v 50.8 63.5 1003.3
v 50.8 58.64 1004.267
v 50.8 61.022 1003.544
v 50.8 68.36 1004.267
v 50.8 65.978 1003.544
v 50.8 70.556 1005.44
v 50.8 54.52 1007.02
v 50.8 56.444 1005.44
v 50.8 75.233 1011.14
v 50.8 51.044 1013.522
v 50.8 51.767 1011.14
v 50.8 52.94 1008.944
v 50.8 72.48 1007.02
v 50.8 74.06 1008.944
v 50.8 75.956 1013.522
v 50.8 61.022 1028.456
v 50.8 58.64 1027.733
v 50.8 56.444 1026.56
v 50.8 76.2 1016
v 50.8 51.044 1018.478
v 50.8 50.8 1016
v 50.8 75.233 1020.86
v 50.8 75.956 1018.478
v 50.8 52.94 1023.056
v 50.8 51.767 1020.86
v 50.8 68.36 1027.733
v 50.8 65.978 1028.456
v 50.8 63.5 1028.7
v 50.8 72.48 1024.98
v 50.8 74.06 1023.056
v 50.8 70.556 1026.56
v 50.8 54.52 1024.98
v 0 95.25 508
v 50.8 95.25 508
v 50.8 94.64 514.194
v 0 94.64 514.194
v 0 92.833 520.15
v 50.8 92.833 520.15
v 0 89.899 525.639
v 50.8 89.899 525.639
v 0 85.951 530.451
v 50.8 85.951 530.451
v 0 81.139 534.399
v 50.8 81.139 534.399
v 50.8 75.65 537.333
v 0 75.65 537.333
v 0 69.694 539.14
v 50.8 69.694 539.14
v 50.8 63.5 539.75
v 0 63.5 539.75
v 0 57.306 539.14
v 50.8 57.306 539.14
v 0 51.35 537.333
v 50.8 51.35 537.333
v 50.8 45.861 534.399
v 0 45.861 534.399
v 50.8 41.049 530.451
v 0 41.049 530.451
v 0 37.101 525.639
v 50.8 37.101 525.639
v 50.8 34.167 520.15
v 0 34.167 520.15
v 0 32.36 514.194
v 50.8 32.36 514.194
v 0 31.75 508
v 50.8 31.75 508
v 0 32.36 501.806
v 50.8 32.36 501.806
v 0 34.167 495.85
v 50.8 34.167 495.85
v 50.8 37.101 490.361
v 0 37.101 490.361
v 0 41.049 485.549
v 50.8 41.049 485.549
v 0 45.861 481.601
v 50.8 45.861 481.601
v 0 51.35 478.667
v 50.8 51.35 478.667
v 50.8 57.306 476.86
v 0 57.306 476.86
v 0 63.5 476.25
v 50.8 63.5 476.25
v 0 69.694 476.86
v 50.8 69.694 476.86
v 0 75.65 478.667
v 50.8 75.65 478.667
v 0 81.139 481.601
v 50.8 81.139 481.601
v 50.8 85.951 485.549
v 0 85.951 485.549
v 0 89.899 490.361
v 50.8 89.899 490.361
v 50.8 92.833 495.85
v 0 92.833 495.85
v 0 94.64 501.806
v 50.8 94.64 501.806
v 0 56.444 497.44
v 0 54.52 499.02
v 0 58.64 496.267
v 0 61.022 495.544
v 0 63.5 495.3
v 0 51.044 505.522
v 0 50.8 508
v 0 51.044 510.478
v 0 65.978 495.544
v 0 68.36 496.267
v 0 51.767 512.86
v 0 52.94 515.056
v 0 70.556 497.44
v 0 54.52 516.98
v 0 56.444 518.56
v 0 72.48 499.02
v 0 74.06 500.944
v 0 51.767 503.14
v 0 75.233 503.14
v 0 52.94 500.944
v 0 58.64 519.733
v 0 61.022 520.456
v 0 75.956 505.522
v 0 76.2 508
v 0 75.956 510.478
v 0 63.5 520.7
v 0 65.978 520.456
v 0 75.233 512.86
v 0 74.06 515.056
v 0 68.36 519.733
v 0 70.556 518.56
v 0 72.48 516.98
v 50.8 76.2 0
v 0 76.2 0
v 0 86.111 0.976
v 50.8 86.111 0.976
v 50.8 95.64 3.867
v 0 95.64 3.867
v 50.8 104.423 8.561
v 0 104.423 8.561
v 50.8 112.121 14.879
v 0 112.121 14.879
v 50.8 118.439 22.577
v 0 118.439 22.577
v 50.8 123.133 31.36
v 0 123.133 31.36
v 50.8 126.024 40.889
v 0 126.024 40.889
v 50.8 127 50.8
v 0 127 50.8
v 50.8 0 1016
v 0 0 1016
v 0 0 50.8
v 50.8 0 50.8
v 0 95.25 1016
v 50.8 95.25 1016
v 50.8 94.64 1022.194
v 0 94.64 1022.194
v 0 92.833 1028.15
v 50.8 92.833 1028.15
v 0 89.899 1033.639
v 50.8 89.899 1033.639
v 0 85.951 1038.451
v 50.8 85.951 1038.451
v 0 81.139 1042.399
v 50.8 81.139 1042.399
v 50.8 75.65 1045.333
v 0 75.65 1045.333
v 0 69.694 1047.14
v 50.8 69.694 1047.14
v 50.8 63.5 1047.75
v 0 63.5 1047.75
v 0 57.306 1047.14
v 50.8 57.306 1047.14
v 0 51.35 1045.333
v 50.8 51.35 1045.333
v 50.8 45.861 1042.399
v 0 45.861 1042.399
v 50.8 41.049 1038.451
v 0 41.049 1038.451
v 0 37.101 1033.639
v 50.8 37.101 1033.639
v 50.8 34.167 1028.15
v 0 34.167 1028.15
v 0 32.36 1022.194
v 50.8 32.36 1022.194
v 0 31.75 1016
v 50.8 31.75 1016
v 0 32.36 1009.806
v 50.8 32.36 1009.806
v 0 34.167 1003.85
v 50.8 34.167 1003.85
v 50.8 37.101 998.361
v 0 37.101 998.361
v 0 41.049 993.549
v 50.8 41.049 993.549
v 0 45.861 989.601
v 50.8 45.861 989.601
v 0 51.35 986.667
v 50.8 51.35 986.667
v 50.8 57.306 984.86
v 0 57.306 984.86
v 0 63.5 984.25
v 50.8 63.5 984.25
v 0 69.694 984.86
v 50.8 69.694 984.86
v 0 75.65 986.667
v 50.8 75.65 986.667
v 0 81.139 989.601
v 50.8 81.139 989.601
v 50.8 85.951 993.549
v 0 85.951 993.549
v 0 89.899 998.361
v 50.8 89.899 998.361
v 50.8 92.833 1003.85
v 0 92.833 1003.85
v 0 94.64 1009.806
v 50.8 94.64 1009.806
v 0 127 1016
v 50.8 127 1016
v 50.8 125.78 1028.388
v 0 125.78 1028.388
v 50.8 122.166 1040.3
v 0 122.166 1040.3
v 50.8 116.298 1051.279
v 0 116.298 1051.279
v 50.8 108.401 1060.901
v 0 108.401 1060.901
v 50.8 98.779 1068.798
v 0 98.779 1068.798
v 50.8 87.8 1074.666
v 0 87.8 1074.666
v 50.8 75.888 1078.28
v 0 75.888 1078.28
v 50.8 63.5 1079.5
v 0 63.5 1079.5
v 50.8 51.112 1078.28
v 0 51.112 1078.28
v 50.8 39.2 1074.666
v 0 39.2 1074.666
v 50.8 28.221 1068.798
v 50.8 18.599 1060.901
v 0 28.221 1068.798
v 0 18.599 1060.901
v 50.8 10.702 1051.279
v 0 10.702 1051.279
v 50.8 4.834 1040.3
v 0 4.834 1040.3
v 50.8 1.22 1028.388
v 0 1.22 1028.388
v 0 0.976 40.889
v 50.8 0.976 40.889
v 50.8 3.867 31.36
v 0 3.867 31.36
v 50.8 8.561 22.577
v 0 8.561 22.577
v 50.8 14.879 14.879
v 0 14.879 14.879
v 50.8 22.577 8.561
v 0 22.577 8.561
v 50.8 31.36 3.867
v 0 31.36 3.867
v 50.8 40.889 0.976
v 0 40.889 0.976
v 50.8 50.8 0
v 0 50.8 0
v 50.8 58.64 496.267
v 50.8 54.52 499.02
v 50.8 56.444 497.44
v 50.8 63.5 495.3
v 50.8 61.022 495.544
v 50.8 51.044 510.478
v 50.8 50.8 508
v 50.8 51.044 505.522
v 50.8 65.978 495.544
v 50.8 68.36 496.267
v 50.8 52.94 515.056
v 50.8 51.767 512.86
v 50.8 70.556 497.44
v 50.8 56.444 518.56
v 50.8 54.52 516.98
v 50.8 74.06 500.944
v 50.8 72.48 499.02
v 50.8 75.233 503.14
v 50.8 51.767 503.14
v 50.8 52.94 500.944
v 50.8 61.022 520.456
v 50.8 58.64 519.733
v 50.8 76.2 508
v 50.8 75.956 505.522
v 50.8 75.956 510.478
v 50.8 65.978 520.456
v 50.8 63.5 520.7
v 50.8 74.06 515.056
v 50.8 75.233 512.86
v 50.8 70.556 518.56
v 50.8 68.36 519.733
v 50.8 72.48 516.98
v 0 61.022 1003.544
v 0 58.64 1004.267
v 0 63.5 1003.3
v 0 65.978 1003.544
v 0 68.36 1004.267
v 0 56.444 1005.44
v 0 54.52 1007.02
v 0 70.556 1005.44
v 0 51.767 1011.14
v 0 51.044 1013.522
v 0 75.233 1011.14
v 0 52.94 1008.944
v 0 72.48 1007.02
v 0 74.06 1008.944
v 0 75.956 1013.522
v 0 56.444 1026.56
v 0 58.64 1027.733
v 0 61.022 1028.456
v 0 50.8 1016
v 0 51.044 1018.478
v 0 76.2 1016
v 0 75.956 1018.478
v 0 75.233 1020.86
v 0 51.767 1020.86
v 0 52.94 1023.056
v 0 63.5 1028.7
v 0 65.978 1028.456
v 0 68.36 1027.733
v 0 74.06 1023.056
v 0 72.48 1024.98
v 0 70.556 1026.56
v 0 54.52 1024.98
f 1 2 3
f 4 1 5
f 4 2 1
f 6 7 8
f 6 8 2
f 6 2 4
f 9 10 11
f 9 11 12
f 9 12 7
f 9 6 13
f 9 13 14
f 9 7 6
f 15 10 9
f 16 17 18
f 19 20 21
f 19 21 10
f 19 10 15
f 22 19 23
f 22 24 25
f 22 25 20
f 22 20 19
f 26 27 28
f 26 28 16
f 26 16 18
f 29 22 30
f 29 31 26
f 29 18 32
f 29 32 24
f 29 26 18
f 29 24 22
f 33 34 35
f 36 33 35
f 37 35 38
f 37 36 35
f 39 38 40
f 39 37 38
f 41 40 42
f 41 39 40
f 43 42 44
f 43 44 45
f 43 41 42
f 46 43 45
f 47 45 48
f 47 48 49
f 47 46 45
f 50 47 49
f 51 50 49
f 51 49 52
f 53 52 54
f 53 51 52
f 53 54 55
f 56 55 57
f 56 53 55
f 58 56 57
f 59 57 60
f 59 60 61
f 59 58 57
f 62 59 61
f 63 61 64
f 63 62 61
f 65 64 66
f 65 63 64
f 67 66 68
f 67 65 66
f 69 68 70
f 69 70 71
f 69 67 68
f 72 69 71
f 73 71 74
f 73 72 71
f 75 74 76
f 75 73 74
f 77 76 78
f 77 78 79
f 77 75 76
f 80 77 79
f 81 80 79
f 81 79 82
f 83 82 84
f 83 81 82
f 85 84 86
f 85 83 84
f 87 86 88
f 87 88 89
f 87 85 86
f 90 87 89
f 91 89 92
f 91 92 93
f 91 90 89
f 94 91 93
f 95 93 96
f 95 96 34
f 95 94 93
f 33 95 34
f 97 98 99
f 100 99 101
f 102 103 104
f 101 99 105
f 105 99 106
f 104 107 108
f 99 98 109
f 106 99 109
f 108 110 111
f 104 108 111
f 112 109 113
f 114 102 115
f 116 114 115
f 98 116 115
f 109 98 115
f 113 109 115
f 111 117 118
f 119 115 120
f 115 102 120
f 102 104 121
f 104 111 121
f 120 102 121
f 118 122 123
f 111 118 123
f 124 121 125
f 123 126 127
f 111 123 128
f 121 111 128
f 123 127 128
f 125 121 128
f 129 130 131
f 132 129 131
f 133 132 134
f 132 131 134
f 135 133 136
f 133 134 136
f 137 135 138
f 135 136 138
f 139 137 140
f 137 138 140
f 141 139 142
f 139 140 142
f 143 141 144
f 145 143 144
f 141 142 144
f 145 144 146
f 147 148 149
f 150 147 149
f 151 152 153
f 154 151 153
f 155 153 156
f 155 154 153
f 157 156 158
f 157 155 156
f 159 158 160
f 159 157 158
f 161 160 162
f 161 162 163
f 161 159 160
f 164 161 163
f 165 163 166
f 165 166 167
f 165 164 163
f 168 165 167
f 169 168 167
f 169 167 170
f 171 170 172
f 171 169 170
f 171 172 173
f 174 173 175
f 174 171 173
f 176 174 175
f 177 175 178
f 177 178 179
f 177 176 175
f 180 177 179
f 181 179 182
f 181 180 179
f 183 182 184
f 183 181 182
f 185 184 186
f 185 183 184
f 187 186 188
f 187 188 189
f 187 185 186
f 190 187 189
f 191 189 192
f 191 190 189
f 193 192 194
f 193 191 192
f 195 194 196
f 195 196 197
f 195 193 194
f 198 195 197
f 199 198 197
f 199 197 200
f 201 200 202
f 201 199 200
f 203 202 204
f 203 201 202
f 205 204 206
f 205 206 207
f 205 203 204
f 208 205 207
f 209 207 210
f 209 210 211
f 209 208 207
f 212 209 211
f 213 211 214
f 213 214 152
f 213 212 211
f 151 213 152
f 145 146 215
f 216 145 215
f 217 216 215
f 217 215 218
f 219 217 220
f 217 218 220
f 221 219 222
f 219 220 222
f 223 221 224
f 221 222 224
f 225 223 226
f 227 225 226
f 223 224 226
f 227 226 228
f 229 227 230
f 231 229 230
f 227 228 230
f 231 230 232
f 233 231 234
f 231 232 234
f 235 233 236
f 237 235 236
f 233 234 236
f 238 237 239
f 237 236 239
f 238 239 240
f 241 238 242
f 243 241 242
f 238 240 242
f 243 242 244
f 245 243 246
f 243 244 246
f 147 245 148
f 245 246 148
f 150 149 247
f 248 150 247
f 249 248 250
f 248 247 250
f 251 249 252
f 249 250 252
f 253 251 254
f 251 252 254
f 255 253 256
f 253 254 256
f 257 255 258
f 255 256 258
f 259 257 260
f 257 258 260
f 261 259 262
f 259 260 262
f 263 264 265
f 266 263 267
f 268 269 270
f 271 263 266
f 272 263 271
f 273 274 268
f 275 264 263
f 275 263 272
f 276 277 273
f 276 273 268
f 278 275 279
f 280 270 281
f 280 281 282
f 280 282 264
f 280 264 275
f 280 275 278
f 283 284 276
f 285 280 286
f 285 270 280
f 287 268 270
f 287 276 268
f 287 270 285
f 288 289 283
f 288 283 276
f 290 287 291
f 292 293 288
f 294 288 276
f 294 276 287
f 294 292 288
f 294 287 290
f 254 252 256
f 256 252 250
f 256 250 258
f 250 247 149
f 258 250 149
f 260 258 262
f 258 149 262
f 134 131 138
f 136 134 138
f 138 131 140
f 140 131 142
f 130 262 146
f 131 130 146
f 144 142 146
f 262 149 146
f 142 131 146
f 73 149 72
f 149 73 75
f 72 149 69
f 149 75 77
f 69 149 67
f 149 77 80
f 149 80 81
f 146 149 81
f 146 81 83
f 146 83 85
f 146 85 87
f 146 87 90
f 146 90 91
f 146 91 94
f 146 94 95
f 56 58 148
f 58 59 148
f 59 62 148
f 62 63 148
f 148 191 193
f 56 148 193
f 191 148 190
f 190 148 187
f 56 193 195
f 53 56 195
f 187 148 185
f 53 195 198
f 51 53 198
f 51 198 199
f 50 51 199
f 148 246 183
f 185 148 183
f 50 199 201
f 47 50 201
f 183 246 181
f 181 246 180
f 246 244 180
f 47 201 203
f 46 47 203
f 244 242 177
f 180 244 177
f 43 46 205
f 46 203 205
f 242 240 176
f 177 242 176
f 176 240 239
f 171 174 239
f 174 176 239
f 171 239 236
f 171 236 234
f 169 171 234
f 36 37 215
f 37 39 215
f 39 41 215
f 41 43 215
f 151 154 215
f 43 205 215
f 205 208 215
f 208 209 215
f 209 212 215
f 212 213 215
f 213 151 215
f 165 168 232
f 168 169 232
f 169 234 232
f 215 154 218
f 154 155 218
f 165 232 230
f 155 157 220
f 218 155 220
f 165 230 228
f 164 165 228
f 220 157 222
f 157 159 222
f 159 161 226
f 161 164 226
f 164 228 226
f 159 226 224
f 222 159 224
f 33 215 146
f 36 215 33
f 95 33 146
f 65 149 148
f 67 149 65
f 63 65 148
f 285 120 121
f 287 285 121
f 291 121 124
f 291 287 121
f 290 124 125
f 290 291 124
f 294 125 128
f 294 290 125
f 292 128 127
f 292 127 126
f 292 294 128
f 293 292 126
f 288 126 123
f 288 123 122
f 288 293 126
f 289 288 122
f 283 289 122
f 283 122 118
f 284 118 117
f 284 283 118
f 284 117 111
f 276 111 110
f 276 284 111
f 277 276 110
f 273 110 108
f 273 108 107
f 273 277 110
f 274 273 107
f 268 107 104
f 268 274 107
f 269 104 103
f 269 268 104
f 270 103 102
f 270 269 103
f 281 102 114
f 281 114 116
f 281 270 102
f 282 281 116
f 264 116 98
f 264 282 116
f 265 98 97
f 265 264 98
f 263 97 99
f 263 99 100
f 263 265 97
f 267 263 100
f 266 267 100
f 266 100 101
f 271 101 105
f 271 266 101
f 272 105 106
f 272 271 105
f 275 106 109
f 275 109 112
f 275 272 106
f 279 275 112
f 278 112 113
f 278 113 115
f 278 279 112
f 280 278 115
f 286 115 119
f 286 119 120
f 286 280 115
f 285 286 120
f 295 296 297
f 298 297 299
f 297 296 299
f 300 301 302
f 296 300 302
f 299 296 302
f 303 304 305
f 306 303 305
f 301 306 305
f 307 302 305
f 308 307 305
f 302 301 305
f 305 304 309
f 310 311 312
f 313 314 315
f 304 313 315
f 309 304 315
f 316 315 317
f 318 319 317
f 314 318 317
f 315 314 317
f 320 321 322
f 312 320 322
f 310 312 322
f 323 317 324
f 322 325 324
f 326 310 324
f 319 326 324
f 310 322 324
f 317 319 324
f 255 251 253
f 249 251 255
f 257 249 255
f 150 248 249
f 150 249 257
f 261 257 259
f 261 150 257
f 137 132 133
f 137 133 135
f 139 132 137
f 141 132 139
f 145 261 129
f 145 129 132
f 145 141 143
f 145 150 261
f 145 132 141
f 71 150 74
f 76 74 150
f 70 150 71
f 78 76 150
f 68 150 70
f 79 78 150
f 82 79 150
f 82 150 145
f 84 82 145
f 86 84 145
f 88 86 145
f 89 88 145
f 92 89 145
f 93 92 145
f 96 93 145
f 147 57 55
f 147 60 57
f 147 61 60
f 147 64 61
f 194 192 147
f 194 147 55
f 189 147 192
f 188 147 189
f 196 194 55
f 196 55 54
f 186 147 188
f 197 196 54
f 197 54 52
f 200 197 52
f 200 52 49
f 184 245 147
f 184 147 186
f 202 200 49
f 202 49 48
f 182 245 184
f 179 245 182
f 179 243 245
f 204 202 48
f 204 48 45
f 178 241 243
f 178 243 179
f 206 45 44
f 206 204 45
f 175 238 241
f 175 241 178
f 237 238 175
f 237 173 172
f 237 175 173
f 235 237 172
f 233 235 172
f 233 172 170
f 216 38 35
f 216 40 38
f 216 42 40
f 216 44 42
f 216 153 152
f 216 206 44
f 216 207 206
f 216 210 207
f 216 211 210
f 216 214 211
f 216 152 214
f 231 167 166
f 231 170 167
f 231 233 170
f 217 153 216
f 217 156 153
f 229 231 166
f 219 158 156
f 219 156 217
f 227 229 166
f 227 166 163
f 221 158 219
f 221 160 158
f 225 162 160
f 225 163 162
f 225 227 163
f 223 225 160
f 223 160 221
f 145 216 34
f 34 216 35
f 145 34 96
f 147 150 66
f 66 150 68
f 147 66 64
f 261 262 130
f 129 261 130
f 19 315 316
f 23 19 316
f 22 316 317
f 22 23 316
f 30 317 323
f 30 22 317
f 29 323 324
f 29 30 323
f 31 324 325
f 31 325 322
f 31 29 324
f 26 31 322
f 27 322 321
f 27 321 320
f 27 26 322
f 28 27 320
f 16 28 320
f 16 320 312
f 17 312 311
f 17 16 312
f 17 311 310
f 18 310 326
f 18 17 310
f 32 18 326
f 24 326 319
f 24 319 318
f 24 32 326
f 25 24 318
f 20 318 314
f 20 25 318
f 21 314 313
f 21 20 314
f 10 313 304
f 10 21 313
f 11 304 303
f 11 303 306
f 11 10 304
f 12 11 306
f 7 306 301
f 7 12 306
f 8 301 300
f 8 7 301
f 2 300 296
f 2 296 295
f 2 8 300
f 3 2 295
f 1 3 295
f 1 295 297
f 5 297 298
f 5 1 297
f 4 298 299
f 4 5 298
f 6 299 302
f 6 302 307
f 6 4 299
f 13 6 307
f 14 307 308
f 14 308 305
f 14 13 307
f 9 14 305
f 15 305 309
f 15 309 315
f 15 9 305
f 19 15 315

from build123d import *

# Parameters (mm, degrees)
F0_R     = 31.75
F1_DEPTH = 50.8
F2_R     = 12.7
F3_DEPTH = 50.8


with BuildPart() as f1:
    # F0 (on Right) → F1 (new body)
    with BuildSketch(Plane.YZ):
        with BuildLine():
            ThreePointArc((0, 50.8), (14.878976, 14.878976), (50.8, 0))
            Line((50.8, 0), (76.2, 0))
            ThreePointArc((76.2, 0), (112.121024, 14.878976), (127, 50.8))
            Line((127, 50.8), (127, 1016))
            ThreePointArc((127, 1016), (63.5, 1079.5), (0, 1016))
            Line((0, 1016), (0, 50.8))
        make_face()
        with Locations((63.5, 508)):
            Circle(F0_R, mode=Mode.SUBTRACT)
        with Locations((63.5, 1016)):
            Circle(F0_R, mode=Mode.SUBTRACT)
    extrude(amount=F1_DEPTH)


with BuildPart() as f3:
    # F2 (on face) → F3 (new body)
    with BuildSketch(Plane.YZ.offset(50.8)):
        with Locations((63.5, 1016)):
            Circle(F2_R)
        with Locations((63.5, 508)):
            Circle(F2_R)
    extrude(amount=-F3_DEPTH)


solid = Compound([f1.part, f3.part])
